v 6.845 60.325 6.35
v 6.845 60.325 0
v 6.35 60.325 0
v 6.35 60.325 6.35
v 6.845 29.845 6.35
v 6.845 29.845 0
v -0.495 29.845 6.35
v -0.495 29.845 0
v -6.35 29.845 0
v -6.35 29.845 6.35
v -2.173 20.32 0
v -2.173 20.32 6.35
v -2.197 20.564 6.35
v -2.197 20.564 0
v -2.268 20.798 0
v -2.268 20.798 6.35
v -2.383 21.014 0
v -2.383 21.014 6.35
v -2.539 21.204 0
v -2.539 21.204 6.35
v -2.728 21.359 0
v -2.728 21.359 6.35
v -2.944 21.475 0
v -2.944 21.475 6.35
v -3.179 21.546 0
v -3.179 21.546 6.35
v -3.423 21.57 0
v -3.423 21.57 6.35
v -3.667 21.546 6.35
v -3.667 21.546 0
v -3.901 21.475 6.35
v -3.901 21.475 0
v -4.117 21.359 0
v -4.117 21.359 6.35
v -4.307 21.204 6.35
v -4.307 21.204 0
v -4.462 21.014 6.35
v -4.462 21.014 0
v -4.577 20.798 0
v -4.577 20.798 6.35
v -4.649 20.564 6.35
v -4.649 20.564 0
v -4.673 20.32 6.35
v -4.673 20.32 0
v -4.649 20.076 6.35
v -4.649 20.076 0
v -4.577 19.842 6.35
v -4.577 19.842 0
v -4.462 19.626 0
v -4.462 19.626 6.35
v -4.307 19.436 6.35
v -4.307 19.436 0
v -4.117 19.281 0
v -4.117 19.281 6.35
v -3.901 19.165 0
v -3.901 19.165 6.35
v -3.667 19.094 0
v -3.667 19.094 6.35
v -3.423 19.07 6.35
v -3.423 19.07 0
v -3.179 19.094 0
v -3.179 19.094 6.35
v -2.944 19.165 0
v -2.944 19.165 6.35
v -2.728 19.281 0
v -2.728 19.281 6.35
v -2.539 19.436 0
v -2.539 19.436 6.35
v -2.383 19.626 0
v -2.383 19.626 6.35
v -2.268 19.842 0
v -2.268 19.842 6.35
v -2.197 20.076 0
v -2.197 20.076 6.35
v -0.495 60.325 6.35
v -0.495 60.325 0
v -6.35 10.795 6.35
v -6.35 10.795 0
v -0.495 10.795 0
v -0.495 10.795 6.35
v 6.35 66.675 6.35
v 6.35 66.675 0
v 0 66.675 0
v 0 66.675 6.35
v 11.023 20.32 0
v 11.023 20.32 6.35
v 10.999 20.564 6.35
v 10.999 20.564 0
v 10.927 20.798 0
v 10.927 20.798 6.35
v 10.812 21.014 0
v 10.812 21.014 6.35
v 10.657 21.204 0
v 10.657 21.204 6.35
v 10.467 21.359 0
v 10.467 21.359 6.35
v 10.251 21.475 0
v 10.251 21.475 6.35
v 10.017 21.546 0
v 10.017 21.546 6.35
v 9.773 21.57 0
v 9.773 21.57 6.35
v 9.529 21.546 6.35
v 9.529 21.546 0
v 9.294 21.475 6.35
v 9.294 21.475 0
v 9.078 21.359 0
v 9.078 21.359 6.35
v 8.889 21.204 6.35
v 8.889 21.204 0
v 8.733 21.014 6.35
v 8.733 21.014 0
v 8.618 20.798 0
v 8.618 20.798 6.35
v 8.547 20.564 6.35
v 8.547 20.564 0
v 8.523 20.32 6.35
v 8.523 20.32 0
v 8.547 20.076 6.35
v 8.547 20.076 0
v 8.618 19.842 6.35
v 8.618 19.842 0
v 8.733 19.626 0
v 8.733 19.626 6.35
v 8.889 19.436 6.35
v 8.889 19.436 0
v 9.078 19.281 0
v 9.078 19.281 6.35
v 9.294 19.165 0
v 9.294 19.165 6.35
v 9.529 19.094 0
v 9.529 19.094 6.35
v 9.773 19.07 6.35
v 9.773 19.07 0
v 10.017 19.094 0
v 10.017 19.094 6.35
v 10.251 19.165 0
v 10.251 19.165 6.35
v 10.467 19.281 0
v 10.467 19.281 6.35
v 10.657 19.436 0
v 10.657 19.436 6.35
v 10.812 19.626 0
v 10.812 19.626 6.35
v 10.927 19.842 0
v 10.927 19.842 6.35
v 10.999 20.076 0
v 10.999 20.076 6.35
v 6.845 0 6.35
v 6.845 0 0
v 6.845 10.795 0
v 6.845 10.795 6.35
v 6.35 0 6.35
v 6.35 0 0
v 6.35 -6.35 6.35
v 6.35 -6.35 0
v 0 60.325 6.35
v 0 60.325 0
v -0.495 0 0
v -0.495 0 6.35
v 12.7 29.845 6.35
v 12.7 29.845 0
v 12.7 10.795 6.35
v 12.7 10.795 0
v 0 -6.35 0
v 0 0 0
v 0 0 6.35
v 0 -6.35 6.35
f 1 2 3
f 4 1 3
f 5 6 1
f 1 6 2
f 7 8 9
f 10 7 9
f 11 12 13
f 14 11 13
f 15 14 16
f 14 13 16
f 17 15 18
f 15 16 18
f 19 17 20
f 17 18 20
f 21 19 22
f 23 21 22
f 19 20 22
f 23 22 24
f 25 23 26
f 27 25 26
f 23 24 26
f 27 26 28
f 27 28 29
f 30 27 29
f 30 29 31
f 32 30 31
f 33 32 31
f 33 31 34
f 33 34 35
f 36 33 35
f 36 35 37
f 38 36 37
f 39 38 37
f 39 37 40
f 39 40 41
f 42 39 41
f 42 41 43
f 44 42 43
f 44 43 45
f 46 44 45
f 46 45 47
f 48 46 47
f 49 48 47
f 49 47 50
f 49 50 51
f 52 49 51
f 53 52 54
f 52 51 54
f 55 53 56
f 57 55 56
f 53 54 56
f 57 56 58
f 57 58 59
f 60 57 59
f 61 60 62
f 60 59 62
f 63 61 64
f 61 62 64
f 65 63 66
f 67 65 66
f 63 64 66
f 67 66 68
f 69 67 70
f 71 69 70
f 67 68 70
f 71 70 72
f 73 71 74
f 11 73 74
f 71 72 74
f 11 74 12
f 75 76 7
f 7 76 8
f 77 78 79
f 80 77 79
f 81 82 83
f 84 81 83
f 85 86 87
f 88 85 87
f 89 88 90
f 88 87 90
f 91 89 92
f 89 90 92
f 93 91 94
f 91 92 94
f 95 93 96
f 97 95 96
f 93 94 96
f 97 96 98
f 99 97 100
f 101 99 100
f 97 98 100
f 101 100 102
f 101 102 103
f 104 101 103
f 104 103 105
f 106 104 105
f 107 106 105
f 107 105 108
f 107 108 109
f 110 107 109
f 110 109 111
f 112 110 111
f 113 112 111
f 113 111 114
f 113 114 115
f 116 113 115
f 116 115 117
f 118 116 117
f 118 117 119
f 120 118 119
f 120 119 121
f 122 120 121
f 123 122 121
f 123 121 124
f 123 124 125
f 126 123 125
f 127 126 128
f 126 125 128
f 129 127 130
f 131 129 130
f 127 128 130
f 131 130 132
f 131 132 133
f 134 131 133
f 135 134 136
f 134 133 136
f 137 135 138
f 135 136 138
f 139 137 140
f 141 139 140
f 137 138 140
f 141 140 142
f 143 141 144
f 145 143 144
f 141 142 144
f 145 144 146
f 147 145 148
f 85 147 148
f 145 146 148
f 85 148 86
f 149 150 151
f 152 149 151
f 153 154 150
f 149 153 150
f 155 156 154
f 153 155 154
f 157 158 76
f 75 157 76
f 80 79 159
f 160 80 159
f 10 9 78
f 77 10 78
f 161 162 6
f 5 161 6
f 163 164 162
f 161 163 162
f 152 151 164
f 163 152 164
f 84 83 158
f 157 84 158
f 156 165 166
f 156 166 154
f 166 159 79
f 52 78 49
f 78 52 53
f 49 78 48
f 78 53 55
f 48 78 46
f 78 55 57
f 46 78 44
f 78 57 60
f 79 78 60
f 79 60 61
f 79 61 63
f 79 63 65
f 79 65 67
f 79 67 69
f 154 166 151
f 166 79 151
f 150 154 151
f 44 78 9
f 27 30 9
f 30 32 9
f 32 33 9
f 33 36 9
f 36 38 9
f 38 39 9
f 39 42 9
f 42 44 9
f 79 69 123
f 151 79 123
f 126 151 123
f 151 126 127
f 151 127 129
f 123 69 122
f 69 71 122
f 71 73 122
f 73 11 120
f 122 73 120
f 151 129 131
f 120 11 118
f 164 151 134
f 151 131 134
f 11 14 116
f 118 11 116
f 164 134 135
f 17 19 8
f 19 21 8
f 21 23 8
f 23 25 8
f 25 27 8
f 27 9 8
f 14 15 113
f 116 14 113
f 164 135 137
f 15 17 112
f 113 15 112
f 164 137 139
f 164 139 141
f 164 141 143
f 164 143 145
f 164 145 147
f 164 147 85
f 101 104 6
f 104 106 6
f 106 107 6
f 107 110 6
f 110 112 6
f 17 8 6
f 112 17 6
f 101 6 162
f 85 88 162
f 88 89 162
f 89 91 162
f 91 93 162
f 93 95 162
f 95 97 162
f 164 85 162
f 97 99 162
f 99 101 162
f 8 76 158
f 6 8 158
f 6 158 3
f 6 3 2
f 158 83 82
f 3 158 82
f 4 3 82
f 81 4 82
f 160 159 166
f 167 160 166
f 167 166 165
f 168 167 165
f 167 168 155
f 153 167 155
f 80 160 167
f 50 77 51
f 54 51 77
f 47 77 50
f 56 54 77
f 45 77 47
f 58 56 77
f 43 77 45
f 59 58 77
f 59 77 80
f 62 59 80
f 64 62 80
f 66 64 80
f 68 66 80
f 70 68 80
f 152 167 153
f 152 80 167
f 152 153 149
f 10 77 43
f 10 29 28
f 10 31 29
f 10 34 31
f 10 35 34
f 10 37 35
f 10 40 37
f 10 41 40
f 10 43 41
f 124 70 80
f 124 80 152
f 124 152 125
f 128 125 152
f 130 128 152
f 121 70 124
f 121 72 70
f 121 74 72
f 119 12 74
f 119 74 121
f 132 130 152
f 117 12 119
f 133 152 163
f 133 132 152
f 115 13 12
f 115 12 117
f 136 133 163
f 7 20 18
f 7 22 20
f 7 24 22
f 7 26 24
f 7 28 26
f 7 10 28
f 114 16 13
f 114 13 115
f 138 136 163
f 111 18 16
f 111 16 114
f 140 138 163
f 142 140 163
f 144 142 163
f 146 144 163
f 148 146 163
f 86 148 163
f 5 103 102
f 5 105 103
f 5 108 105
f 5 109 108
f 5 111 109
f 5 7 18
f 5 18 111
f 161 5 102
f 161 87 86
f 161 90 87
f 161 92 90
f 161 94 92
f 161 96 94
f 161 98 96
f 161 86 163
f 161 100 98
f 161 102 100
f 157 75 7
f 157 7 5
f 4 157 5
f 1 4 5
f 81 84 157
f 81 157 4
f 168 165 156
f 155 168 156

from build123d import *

# Parameters (mm, degrees)
BOSS_EXTRUDE1_DEPTH = 6.35
SKETCH2_R           = 1.25
CUT_EXTRUDE1_DEPTH  = 7.35


with BuildPart() as part:
    # Sketch1 → Boss-Extrude1 (new body)
    with BuildSketch(Plane.XY):
        Polygon((0, -6.35), (6.35, -6.35), (6.35, 0), (6.8453, 0), (6.8453, 10.795), (12.7, 10.795), (12.7, 29.845), (6.8453, 29.845), (6.8453, 60.325), (6.35, 60.325), (6.35, 66.675), (0, 66.675), (0, 60.325), (-0.4953, 60.325), (-0.4953, 29.845), (-6.35, 29.845), (-6.35, 10.795), (-0.4953, 10.795), (-0.4953, 0), (0, 0), align=None)
    extrude(amount=BOSS_EXTRUDE1_DEPTH)

    # Sketch2 → Cut-Extrude1 (cut, through all)
    with BuildSketch(Plane.XY.offset(6.35)):
        with Locations((-3.42265, 20.32)):
            Circle(SKETCH2_R)
        with Locations((9.77265, 20.32)):
            Circle(SKETCH2_R)
    extrude(amount=-CUT_EXTRUDE1_DEPTH, mode=Mode.SUBTRACT)


solid = part.part
